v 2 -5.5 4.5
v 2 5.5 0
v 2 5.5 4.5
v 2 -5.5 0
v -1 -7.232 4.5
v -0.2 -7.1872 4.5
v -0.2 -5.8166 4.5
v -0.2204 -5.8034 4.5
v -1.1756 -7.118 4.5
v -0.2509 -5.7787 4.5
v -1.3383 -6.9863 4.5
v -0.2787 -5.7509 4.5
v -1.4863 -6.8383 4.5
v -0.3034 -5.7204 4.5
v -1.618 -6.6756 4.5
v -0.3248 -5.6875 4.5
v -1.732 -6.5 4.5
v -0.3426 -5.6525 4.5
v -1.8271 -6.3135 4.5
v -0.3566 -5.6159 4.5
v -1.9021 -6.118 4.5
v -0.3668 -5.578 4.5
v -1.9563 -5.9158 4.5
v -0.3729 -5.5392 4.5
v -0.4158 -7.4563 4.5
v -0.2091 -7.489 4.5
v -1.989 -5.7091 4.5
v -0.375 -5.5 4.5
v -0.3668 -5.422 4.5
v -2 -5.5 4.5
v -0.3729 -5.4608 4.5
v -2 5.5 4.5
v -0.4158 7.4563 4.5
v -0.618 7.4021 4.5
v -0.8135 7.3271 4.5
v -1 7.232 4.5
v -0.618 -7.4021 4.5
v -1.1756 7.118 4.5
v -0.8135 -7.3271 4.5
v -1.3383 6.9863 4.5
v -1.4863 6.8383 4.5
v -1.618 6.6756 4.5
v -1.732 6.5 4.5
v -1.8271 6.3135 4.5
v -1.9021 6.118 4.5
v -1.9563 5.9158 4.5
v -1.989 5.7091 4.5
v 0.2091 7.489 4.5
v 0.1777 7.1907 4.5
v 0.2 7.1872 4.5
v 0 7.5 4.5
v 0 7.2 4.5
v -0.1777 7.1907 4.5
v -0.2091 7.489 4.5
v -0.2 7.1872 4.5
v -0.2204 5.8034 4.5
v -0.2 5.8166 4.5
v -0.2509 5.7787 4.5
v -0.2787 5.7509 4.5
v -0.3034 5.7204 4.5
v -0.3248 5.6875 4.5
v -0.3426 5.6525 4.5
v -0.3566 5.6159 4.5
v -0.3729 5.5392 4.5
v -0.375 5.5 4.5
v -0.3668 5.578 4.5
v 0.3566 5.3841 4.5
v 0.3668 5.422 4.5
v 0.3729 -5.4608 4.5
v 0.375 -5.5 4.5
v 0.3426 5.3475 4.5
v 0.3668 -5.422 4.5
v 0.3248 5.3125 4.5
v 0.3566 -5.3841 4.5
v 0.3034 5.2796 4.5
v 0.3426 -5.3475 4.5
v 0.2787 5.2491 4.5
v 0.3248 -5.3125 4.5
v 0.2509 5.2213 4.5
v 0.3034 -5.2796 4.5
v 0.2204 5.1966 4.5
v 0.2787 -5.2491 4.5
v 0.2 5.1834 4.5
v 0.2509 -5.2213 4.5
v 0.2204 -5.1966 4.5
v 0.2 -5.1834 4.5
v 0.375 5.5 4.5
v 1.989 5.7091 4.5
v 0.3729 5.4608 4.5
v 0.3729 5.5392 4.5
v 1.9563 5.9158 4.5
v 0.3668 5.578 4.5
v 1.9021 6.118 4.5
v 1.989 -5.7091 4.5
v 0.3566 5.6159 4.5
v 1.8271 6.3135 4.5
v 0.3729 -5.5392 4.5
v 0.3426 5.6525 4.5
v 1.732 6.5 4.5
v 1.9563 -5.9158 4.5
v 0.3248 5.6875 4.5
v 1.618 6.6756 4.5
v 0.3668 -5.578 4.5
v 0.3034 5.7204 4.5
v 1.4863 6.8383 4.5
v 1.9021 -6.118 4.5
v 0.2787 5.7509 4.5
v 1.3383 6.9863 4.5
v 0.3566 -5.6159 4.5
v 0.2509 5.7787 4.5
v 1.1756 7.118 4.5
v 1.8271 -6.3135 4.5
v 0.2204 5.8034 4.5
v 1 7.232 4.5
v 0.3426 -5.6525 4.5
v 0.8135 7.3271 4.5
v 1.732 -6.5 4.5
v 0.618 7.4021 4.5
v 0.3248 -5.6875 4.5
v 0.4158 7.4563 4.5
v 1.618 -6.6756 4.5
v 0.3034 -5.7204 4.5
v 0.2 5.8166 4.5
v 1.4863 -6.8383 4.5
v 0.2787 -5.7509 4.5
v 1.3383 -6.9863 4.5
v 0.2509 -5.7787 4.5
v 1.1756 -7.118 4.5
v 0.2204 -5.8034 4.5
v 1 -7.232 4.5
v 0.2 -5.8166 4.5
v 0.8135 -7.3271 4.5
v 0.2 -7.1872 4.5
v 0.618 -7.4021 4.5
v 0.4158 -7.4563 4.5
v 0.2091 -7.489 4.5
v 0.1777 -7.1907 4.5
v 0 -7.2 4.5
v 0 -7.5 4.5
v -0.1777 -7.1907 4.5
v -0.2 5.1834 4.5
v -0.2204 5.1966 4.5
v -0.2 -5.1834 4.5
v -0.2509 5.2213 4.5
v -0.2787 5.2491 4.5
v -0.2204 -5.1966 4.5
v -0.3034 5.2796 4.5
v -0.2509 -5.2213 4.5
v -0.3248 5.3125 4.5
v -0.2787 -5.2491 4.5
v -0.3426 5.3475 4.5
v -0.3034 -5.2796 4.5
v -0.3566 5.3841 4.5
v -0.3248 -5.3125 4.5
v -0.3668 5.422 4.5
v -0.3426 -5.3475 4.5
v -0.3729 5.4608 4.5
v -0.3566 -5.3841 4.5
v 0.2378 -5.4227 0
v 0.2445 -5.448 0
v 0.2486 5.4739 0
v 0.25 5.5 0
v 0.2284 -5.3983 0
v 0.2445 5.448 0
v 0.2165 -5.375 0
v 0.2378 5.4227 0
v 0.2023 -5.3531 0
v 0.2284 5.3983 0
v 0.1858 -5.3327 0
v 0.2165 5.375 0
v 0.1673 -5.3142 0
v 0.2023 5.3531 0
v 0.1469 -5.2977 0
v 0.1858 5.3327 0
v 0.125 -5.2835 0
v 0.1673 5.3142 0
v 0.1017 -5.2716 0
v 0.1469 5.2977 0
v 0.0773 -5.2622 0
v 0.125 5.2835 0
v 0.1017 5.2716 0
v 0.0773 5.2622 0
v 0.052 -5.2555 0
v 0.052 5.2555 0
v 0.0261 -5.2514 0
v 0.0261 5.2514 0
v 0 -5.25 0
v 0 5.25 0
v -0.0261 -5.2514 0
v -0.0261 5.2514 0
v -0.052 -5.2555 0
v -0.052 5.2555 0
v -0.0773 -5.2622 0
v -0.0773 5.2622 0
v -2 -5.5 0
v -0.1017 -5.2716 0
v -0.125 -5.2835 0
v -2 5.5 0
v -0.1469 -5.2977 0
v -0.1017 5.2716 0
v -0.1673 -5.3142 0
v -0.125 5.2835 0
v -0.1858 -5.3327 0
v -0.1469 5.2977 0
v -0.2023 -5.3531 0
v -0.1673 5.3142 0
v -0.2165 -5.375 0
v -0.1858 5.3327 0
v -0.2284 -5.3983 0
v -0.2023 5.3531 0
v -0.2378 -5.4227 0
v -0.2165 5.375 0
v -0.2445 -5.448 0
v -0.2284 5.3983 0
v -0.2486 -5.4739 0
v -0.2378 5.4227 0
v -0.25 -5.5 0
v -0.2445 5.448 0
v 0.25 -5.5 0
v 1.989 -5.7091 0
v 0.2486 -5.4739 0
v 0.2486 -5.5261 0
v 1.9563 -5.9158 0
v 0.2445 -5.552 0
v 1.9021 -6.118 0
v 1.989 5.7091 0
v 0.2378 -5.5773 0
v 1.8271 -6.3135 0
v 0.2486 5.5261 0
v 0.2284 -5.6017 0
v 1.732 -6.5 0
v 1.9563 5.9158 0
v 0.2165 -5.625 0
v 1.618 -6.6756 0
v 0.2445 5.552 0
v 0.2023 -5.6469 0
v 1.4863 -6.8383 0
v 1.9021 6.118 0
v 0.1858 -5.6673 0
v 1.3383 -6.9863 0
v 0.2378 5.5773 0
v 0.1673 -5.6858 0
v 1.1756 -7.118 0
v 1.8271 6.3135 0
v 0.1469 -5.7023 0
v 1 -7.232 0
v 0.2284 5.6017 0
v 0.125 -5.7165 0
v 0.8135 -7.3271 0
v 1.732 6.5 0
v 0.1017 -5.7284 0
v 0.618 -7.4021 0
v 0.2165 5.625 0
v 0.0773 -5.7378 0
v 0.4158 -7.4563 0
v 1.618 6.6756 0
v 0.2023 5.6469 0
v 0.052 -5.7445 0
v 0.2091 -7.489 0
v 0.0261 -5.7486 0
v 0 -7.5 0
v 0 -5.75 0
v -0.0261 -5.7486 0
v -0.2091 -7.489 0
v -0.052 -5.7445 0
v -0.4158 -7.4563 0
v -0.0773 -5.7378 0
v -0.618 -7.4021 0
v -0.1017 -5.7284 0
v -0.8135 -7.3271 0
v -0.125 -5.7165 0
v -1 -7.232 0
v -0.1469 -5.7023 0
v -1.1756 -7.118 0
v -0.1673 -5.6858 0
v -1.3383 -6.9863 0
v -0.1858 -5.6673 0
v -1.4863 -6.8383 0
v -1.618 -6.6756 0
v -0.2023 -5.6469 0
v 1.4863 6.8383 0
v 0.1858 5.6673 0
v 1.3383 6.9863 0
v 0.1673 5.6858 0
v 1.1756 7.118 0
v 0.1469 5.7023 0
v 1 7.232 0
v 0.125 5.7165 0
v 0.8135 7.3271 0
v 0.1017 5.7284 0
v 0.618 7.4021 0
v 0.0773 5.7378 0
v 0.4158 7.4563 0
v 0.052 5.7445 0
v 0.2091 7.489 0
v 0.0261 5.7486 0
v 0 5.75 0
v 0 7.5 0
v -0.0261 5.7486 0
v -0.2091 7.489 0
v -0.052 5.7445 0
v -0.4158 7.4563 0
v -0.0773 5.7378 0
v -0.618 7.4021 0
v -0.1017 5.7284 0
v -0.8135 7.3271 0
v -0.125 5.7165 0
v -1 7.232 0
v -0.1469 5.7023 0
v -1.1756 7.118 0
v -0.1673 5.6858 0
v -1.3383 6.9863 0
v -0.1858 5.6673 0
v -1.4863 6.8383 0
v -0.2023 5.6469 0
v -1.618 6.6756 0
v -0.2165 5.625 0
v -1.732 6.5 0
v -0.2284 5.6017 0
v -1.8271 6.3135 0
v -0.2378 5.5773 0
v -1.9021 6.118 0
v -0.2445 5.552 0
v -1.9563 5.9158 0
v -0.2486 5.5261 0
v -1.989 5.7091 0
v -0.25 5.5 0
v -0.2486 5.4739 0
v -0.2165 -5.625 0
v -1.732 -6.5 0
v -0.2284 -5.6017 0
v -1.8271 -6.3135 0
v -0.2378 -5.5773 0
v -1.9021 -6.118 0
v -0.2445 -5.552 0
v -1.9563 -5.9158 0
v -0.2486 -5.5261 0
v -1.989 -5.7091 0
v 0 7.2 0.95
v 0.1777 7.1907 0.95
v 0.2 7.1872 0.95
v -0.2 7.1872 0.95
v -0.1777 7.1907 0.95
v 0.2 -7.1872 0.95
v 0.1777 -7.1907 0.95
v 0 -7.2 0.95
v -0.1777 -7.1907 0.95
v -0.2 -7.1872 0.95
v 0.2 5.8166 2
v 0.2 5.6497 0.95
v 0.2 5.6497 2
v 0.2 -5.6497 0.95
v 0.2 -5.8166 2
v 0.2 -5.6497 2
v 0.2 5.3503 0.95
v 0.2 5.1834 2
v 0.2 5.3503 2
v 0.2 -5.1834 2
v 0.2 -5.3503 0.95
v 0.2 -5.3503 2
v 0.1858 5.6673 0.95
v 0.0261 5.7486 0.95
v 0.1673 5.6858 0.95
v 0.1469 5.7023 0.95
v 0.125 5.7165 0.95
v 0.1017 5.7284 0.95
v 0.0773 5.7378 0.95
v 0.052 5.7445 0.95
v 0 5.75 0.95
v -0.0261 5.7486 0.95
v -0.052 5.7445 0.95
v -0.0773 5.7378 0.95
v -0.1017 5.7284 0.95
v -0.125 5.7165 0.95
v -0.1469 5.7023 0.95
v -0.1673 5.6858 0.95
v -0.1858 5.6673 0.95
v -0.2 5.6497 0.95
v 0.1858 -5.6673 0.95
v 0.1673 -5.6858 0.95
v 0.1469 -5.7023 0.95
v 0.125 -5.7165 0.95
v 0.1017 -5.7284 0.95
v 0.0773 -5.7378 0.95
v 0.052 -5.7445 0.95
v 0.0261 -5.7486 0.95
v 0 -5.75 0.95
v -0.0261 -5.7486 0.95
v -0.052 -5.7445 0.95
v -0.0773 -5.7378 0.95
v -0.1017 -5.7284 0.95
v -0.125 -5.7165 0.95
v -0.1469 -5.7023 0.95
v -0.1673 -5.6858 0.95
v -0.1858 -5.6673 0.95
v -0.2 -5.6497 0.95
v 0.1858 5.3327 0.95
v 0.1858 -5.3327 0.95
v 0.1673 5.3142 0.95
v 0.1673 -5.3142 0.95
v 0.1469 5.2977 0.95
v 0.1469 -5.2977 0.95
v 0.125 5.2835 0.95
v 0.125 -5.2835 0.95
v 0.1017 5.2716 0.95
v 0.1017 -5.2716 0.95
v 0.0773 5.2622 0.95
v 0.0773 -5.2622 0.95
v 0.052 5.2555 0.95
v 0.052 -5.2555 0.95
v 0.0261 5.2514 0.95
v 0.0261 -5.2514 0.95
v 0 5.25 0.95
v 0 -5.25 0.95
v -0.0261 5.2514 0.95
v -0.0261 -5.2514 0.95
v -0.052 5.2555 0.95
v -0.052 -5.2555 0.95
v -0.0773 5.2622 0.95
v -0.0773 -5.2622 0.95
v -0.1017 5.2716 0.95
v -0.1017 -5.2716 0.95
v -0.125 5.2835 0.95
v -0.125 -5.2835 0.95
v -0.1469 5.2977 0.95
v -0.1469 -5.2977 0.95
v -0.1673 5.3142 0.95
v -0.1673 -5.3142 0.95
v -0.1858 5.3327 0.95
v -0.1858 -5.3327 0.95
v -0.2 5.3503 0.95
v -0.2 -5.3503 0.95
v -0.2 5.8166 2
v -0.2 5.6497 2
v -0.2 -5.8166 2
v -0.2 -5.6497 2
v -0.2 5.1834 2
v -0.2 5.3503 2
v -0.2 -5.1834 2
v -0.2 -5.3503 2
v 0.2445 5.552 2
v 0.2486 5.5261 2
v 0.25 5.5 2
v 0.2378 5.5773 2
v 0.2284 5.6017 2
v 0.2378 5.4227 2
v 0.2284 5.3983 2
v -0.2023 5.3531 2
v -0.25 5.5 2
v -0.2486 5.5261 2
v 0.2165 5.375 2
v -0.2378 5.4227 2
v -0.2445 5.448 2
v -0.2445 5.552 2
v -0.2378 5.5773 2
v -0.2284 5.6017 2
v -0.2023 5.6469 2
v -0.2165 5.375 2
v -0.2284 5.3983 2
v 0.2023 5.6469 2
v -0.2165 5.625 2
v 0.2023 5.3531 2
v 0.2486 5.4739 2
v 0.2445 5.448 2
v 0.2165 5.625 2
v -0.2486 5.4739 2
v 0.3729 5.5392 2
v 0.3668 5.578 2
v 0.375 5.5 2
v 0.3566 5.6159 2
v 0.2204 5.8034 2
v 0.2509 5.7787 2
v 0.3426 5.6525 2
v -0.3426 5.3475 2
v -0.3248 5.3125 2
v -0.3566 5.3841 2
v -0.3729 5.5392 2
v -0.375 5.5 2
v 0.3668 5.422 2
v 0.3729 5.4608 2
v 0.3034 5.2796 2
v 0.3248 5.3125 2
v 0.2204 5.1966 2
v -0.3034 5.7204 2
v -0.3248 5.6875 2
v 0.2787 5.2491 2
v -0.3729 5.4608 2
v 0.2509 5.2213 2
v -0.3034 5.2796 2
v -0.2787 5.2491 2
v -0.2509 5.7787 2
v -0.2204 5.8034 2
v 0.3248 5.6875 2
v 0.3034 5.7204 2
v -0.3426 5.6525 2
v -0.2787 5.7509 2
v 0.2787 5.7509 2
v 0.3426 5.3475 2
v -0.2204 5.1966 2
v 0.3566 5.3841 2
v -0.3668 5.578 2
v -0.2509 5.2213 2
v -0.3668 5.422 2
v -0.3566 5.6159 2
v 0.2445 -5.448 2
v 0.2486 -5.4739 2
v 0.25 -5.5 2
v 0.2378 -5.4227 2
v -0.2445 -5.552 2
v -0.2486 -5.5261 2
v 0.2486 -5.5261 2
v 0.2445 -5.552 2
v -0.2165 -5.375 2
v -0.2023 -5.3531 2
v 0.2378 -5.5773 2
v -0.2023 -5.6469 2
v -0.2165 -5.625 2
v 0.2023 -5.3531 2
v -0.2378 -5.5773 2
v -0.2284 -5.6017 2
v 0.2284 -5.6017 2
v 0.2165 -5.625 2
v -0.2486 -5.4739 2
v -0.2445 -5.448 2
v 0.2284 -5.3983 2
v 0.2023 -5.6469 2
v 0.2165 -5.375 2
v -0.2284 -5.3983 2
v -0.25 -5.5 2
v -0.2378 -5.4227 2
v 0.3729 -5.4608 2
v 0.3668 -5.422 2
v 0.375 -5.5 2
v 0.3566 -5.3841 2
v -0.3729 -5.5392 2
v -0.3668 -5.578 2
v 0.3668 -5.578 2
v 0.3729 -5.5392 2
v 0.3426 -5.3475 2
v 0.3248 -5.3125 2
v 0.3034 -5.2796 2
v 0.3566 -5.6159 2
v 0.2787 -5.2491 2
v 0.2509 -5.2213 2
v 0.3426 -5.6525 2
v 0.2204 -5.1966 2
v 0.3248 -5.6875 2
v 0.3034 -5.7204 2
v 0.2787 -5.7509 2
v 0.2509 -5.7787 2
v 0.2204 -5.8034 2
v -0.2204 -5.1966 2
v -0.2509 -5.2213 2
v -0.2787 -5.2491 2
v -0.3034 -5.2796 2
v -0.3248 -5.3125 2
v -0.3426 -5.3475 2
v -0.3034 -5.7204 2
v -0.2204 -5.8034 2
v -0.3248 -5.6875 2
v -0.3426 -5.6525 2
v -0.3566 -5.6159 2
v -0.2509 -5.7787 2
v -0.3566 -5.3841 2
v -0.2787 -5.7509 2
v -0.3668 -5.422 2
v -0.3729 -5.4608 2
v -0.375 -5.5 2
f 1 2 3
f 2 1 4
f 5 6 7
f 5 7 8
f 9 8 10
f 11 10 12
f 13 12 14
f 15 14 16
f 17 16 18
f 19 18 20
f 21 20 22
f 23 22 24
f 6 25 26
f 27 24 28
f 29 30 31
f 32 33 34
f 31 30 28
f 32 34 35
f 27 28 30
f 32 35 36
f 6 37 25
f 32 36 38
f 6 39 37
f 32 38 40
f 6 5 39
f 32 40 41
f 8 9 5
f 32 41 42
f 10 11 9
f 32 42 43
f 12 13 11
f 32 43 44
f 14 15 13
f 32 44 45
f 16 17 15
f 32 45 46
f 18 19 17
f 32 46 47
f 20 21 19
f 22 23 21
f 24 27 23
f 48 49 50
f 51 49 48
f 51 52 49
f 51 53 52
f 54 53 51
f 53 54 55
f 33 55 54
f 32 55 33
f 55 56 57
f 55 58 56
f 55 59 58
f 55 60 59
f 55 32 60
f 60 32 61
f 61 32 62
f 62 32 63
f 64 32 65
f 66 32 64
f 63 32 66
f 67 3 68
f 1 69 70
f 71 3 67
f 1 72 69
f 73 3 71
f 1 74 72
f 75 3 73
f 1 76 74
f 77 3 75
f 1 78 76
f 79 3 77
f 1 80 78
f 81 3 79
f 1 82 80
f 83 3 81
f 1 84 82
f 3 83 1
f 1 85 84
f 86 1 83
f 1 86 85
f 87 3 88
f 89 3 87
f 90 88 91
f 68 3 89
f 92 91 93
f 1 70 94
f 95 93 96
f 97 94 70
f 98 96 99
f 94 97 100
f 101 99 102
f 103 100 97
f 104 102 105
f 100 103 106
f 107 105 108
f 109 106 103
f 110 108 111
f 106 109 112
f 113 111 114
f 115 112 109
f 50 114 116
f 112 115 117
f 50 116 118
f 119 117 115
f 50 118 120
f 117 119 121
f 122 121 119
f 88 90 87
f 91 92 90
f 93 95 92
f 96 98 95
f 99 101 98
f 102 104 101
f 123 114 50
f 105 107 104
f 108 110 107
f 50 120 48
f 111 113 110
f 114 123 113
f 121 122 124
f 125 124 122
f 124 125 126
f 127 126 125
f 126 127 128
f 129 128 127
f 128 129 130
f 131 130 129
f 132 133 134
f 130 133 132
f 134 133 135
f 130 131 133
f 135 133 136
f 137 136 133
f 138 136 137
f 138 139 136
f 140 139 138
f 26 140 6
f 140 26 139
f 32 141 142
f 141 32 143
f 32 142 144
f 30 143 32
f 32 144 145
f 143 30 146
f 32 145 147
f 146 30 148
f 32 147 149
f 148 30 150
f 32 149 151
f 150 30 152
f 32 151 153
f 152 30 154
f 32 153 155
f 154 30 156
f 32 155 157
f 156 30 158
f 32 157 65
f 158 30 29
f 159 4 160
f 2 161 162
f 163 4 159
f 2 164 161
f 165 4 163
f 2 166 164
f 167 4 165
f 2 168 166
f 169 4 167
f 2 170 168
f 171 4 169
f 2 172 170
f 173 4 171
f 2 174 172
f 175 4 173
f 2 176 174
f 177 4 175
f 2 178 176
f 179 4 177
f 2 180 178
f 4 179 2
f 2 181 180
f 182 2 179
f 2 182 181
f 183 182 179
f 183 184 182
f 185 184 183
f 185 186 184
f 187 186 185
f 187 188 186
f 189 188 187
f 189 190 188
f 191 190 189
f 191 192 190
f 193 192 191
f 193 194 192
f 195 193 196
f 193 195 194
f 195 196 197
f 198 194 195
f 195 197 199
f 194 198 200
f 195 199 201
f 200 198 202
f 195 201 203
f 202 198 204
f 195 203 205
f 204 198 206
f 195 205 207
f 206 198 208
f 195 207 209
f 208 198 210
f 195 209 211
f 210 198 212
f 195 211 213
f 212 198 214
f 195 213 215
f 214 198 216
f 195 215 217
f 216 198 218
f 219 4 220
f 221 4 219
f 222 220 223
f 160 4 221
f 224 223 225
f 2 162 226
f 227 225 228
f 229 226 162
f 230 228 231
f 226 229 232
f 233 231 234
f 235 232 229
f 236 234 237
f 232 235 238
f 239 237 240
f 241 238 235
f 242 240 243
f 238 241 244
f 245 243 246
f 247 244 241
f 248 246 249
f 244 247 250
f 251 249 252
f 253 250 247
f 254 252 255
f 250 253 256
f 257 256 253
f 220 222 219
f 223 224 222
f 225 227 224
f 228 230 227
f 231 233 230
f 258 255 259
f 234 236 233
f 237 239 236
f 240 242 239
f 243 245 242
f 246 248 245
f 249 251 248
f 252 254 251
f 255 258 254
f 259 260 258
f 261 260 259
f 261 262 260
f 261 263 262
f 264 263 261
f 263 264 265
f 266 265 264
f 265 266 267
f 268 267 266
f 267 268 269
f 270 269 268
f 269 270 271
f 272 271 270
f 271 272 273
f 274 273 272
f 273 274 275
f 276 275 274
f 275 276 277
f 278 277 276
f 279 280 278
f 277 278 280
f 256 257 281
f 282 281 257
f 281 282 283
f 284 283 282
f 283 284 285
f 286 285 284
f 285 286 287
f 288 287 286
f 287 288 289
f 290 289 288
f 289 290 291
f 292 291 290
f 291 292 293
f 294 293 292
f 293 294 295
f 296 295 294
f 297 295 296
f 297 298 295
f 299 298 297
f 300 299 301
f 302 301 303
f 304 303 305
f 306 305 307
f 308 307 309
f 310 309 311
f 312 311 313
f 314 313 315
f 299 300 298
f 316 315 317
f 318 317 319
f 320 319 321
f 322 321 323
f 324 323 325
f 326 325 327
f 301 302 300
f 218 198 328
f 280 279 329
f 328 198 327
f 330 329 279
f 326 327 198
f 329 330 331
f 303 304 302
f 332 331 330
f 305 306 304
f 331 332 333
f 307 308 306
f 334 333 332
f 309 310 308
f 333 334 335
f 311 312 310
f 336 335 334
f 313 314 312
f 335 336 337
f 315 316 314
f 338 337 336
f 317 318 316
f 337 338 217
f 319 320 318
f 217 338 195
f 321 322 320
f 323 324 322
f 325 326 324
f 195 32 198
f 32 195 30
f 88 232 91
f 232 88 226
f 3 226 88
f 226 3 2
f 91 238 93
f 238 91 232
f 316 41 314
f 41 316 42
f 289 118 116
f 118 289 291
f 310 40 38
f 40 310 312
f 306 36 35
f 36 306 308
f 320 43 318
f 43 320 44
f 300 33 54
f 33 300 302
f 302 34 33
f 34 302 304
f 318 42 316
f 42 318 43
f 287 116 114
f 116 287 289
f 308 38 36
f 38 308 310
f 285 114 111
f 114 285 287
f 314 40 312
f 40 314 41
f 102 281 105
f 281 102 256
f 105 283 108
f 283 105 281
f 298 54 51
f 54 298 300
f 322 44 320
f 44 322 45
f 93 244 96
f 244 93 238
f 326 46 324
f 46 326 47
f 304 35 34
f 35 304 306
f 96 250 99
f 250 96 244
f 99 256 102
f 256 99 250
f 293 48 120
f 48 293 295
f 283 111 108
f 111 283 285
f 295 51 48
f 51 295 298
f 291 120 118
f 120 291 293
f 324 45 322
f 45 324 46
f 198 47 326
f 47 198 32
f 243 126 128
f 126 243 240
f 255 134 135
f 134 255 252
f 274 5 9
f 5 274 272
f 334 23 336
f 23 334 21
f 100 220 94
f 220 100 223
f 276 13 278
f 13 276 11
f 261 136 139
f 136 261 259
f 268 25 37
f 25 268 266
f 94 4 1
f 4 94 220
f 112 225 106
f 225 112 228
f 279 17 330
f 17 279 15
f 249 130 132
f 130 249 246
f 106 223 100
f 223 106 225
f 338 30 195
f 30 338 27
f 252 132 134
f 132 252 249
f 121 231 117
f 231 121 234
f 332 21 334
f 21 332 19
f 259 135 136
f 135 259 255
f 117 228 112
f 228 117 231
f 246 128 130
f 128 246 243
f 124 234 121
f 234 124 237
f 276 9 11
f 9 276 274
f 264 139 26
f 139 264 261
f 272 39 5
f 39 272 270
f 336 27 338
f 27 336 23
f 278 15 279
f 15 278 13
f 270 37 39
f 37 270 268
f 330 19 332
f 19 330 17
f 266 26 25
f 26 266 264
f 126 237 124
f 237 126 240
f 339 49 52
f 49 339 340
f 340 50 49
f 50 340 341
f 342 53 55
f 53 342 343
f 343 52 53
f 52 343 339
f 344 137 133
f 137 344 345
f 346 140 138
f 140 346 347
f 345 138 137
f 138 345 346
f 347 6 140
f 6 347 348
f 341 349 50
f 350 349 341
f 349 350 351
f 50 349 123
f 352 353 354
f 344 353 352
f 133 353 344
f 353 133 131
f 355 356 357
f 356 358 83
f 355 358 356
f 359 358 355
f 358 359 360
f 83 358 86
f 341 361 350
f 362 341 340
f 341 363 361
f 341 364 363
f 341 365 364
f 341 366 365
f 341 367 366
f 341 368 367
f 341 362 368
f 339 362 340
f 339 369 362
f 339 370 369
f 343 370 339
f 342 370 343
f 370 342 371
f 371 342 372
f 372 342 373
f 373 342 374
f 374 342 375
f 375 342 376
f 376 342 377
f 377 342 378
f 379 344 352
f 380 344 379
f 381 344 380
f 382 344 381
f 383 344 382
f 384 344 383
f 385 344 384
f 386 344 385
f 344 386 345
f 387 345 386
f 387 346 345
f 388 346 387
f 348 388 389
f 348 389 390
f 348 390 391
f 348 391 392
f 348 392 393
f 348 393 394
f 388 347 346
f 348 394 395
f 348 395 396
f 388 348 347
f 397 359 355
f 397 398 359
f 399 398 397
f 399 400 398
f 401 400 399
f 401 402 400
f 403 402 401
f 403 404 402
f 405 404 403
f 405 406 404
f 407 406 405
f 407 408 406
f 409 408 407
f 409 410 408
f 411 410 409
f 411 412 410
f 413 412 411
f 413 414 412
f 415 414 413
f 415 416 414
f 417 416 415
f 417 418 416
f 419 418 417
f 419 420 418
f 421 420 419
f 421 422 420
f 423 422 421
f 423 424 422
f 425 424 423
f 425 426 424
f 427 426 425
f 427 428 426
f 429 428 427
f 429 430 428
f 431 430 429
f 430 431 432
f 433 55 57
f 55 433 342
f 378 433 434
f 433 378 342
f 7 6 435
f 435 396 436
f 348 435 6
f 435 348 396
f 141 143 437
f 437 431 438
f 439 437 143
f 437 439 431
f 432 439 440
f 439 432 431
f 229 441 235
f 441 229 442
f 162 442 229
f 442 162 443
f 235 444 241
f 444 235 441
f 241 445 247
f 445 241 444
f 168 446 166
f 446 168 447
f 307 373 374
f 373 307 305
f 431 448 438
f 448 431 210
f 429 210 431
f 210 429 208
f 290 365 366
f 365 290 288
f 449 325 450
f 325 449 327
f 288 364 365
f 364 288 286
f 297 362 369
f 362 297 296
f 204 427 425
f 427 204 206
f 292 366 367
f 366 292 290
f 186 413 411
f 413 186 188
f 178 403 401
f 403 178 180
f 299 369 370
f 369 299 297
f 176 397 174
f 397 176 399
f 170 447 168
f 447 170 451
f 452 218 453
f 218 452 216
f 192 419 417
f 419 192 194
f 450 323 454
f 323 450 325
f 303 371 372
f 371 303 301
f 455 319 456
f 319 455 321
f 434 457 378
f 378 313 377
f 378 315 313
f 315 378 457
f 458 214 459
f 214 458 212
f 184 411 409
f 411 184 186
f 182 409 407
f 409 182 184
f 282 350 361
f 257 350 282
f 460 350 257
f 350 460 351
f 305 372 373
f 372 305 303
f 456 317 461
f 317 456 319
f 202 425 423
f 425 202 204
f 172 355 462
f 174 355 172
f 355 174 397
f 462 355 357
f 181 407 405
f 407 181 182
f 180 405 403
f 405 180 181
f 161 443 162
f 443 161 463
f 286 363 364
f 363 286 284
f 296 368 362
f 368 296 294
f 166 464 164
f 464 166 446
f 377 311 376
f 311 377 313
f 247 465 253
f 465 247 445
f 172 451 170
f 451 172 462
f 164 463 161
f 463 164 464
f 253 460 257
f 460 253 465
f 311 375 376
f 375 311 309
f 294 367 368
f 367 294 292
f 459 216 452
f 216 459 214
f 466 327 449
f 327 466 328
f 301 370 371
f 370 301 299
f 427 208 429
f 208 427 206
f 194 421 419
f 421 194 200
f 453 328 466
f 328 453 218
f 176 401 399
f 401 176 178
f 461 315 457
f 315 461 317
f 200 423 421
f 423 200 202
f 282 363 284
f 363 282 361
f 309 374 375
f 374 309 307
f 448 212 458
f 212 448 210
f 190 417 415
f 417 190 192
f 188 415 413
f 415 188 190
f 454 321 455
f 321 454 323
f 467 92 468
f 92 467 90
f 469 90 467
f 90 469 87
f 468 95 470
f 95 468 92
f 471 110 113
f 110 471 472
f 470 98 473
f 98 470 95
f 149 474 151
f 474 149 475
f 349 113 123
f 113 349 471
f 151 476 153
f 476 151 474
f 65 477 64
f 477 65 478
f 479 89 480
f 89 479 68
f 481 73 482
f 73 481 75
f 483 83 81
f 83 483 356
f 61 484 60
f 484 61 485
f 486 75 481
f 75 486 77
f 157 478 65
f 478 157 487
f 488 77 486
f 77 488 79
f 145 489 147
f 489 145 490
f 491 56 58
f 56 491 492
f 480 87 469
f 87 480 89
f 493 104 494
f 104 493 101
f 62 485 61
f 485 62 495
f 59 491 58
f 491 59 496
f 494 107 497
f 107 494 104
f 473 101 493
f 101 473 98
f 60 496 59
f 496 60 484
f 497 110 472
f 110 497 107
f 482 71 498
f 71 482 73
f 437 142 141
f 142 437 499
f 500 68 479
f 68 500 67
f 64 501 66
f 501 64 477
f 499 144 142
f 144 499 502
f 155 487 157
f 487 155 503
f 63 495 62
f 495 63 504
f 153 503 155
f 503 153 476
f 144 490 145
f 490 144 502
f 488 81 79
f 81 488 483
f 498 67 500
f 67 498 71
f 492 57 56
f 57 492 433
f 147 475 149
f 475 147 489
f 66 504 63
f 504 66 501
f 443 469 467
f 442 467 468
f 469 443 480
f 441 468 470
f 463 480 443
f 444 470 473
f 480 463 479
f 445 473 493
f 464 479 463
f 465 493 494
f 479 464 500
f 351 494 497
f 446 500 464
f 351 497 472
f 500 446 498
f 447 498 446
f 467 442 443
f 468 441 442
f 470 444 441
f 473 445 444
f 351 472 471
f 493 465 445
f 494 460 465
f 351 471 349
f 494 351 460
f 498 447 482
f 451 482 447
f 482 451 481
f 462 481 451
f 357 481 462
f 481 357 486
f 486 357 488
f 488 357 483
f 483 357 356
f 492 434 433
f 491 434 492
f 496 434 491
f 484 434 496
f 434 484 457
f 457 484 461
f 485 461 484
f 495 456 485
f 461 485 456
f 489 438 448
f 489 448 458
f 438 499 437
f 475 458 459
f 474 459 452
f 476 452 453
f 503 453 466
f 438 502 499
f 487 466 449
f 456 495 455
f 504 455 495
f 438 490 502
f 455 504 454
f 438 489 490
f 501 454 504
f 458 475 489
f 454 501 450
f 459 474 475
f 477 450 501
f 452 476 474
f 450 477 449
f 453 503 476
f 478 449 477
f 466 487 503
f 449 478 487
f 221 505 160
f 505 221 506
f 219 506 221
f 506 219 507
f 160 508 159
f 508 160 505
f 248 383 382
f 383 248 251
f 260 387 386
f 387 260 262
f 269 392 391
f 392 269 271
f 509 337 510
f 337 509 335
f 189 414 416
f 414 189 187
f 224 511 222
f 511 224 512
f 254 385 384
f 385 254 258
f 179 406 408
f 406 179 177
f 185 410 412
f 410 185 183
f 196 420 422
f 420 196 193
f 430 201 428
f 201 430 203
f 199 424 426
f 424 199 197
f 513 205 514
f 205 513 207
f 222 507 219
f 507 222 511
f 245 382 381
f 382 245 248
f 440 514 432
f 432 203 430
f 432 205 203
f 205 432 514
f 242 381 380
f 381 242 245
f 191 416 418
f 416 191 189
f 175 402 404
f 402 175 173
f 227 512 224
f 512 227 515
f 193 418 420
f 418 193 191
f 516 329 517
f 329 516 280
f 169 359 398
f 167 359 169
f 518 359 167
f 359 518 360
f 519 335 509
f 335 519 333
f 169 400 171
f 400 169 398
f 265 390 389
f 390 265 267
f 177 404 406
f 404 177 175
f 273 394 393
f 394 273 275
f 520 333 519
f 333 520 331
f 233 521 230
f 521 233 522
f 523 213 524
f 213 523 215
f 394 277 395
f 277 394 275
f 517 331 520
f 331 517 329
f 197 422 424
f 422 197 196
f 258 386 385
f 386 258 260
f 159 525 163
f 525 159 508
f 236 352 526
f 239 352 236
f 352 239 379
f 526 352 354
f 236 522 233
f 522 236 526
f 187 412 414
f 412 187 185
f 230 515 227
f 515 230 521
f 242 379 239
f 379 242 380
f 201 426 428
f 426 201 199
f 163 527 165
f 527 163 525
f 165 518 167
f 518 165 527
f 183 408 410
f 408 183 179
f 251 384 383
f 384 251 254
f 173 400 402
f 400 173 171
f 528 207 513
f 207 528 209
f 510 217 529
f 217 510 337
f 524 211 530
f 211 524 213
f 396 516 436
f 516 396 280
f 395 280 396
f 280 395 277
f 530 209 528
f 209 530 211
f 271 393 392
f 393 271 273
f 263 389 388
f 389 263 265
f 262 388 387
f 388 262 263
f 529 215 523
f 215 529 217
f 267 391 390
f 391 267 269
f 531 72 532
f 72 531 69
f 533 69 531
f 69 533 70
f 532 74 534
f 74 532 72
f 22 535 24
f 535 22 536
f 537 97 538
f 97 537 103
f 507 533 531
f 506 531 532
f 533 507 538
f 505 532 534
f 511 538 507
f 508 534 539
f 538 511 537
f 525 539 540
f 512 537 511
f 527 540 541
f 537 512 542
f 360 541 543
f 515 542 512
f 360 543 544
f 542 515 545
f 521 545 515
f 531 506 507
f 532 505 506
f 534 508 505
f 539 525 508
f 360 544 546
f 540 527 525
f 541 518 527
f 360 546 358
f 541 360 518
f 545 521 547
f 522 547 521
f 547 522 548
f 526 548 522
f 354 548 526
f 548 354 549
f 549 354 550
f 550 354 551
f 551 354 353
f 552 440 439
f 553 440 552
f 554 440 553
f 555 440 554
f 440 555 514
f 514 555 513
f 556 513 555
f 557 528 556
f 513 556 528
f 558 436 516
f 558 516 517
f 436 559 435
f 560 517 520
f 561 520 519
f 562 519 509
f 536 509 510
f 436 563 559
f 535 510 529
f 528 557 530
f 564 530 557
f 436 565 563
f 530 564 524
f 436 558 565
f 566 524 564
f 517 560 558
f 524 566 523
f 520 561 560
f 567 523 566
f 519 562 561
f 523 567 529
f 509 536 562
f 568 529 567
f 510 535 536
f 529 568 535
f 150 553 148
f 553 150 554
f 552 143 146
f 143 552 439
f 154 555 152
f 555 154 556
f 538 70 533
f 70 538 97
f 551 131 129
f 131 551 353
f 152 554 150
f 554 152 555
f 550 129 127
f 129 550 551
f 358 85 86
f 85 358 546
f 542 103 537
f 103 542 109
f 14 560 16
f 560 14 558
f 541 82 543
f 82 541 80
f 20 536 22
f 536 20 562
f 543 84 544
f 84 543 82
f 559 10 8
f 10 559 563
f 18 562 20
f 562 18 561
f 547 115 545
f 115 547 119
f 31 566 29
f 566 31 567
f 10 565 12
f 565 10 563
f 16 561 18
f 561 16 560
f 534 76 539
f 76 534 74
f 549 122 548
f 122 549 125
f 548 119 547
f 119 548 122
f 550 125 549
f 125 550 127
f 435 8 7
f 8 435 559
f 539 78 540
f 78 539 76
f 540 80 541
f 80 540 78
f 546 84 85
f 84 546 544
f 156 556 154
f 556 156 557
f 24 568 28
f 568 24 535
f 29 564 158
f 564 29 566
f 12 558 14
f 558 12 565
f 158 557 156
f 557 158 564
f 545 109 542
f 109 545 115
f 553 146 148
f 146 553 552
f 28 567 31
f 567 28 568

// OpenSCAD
// [FL_INDEX: keywords="openscad, 3d_parametric, Customizable_Wall_Mount_Key_Holder, csg_solid" | COT="Parametric OpenSCAD design from 3DCodeverse"]
// Title: Customizable Wall Mount Key Holder

//CUSTOMIZER VARIABLES

//Number of slots in holder.
numOfSlots = 1; // [1 : 5]

//Height of the holder.
totalHeight = 4;

//Total length.
totalWidth = 15;

//Space around the edge.
edgeGap = 1;

//Gap size for the keys
keyGap = 0.4;

//Size of hole for screws
screwHoleDiameter = 0.5;

//Size of hoe where screw heads are sunk.
screwHeadDiameter = 0.75;

//CUSTOMIZER END


function getInterp(p) = lookup(p, [[0, -(totalHeight-edgeGap)/2], [(numOfSlots-1)/2, 0], [(numOfSlots-1), (totalHeight-edgeGap)/2]]);

function getGapInterp(p) = lookup(p, [[0, -(totalHeight-edgeGap)/2], [(numOfSlots-1)/2, 0], [(numOfSlots-1), (totalHeight-edgeGap)/2]]);



difference(){
	union() {
	translate([0, 0, 2.25]) cube(size=[totalHeight, totalWidth-totalHeight, 4.5], center=true);
	translate([0, totalWidth/2-totalHeight/2, 0]) cylinder(h=4.5, r1=totalHeight/2, r2=totalHeight/2, $fn=60);
	translate([0, -(totalWidth/2-totalHeight/2), 0]) cylinder(h=4.5, r1=totalHeight/2, r2=totalHeight/2, $fn=60);
	}

	difference(){
		
		if (numOfSlots > 2){
			for (i =[0 : numOfSlots-1]){
				translate([getInterp(i), 0, 2.75]) cube(size=[keyGap, totalWidth, 3.6], center=true);
			}
		}
		if (numOfSlots == 2){
			for (i =[0 : numOfSlots-1]){
				translate([getInterp(i)/1.5, 0, 2.75]) cube(size=[keyGap, totalWidth, 3.6], center=true);
			}
		}
		if (numOfSlots == 1){
			for (i =[0 : numOfSlots-1]){
				translate([0, 0, 2.75]) cube(size=[keyGap, totalWidth, 3.6], center=true);
			}
		}

		difference(){
			translate([0, totalWidth/2-totalHeight/2+2.5, 3]) cube(size=[5, 5, 5], center=true);
			translate([0, totalWidth/2-totalHeight/2, -1]) cylinder(h=7, r1=(totalHeight/2)-edgeGap/2+keyGap/2, r2=(totalHeight/2)-edgeGap/2+keyGap/2, $fn=60);
			}
	
		difference(){
			translate([0, -(totalWidth/2-totalHeight/2)-2.5, 3]) cube(size=[5, 5, 5], center=true);
			translate([0, -(totalWidth/2-totalHeight/2), -1]) cylinder(h=7, r1=(totalHeight/2)-edgeGap/2+keyGap/2, r2=(totalHeight/2)-edgeGap/2+keyGap/2, $fn=60);
			}

	}

	translate([0, totalWidth/2-totalHeight/2, 0]) cylinder(h=15, r1=screwHoleDiameter/2, r2=screwHoleDiameter/2, $fn=60, center=true);
	translate([0, totalWidth/2-totalHeight/2, 2.0]) cylinder(h=15, r1=screwHeadDiameter/2, r2=screwHeadDiameter/2, $fn=60);
	translate([0, -(totalWidth/2-totalHeight/2), 0]) cylinder(h=15, r1=screwHoleDiameter/2, r2=screwHoleDiameter/2, $fn=60, center=true);
	translate([0, -(totalWidth/2-totalHeight/2), 2.0]) cylinder(h=15, r1=screwHeadDiameter/2, r2=screwHeadDiameter/2, $fn=60);	

}
